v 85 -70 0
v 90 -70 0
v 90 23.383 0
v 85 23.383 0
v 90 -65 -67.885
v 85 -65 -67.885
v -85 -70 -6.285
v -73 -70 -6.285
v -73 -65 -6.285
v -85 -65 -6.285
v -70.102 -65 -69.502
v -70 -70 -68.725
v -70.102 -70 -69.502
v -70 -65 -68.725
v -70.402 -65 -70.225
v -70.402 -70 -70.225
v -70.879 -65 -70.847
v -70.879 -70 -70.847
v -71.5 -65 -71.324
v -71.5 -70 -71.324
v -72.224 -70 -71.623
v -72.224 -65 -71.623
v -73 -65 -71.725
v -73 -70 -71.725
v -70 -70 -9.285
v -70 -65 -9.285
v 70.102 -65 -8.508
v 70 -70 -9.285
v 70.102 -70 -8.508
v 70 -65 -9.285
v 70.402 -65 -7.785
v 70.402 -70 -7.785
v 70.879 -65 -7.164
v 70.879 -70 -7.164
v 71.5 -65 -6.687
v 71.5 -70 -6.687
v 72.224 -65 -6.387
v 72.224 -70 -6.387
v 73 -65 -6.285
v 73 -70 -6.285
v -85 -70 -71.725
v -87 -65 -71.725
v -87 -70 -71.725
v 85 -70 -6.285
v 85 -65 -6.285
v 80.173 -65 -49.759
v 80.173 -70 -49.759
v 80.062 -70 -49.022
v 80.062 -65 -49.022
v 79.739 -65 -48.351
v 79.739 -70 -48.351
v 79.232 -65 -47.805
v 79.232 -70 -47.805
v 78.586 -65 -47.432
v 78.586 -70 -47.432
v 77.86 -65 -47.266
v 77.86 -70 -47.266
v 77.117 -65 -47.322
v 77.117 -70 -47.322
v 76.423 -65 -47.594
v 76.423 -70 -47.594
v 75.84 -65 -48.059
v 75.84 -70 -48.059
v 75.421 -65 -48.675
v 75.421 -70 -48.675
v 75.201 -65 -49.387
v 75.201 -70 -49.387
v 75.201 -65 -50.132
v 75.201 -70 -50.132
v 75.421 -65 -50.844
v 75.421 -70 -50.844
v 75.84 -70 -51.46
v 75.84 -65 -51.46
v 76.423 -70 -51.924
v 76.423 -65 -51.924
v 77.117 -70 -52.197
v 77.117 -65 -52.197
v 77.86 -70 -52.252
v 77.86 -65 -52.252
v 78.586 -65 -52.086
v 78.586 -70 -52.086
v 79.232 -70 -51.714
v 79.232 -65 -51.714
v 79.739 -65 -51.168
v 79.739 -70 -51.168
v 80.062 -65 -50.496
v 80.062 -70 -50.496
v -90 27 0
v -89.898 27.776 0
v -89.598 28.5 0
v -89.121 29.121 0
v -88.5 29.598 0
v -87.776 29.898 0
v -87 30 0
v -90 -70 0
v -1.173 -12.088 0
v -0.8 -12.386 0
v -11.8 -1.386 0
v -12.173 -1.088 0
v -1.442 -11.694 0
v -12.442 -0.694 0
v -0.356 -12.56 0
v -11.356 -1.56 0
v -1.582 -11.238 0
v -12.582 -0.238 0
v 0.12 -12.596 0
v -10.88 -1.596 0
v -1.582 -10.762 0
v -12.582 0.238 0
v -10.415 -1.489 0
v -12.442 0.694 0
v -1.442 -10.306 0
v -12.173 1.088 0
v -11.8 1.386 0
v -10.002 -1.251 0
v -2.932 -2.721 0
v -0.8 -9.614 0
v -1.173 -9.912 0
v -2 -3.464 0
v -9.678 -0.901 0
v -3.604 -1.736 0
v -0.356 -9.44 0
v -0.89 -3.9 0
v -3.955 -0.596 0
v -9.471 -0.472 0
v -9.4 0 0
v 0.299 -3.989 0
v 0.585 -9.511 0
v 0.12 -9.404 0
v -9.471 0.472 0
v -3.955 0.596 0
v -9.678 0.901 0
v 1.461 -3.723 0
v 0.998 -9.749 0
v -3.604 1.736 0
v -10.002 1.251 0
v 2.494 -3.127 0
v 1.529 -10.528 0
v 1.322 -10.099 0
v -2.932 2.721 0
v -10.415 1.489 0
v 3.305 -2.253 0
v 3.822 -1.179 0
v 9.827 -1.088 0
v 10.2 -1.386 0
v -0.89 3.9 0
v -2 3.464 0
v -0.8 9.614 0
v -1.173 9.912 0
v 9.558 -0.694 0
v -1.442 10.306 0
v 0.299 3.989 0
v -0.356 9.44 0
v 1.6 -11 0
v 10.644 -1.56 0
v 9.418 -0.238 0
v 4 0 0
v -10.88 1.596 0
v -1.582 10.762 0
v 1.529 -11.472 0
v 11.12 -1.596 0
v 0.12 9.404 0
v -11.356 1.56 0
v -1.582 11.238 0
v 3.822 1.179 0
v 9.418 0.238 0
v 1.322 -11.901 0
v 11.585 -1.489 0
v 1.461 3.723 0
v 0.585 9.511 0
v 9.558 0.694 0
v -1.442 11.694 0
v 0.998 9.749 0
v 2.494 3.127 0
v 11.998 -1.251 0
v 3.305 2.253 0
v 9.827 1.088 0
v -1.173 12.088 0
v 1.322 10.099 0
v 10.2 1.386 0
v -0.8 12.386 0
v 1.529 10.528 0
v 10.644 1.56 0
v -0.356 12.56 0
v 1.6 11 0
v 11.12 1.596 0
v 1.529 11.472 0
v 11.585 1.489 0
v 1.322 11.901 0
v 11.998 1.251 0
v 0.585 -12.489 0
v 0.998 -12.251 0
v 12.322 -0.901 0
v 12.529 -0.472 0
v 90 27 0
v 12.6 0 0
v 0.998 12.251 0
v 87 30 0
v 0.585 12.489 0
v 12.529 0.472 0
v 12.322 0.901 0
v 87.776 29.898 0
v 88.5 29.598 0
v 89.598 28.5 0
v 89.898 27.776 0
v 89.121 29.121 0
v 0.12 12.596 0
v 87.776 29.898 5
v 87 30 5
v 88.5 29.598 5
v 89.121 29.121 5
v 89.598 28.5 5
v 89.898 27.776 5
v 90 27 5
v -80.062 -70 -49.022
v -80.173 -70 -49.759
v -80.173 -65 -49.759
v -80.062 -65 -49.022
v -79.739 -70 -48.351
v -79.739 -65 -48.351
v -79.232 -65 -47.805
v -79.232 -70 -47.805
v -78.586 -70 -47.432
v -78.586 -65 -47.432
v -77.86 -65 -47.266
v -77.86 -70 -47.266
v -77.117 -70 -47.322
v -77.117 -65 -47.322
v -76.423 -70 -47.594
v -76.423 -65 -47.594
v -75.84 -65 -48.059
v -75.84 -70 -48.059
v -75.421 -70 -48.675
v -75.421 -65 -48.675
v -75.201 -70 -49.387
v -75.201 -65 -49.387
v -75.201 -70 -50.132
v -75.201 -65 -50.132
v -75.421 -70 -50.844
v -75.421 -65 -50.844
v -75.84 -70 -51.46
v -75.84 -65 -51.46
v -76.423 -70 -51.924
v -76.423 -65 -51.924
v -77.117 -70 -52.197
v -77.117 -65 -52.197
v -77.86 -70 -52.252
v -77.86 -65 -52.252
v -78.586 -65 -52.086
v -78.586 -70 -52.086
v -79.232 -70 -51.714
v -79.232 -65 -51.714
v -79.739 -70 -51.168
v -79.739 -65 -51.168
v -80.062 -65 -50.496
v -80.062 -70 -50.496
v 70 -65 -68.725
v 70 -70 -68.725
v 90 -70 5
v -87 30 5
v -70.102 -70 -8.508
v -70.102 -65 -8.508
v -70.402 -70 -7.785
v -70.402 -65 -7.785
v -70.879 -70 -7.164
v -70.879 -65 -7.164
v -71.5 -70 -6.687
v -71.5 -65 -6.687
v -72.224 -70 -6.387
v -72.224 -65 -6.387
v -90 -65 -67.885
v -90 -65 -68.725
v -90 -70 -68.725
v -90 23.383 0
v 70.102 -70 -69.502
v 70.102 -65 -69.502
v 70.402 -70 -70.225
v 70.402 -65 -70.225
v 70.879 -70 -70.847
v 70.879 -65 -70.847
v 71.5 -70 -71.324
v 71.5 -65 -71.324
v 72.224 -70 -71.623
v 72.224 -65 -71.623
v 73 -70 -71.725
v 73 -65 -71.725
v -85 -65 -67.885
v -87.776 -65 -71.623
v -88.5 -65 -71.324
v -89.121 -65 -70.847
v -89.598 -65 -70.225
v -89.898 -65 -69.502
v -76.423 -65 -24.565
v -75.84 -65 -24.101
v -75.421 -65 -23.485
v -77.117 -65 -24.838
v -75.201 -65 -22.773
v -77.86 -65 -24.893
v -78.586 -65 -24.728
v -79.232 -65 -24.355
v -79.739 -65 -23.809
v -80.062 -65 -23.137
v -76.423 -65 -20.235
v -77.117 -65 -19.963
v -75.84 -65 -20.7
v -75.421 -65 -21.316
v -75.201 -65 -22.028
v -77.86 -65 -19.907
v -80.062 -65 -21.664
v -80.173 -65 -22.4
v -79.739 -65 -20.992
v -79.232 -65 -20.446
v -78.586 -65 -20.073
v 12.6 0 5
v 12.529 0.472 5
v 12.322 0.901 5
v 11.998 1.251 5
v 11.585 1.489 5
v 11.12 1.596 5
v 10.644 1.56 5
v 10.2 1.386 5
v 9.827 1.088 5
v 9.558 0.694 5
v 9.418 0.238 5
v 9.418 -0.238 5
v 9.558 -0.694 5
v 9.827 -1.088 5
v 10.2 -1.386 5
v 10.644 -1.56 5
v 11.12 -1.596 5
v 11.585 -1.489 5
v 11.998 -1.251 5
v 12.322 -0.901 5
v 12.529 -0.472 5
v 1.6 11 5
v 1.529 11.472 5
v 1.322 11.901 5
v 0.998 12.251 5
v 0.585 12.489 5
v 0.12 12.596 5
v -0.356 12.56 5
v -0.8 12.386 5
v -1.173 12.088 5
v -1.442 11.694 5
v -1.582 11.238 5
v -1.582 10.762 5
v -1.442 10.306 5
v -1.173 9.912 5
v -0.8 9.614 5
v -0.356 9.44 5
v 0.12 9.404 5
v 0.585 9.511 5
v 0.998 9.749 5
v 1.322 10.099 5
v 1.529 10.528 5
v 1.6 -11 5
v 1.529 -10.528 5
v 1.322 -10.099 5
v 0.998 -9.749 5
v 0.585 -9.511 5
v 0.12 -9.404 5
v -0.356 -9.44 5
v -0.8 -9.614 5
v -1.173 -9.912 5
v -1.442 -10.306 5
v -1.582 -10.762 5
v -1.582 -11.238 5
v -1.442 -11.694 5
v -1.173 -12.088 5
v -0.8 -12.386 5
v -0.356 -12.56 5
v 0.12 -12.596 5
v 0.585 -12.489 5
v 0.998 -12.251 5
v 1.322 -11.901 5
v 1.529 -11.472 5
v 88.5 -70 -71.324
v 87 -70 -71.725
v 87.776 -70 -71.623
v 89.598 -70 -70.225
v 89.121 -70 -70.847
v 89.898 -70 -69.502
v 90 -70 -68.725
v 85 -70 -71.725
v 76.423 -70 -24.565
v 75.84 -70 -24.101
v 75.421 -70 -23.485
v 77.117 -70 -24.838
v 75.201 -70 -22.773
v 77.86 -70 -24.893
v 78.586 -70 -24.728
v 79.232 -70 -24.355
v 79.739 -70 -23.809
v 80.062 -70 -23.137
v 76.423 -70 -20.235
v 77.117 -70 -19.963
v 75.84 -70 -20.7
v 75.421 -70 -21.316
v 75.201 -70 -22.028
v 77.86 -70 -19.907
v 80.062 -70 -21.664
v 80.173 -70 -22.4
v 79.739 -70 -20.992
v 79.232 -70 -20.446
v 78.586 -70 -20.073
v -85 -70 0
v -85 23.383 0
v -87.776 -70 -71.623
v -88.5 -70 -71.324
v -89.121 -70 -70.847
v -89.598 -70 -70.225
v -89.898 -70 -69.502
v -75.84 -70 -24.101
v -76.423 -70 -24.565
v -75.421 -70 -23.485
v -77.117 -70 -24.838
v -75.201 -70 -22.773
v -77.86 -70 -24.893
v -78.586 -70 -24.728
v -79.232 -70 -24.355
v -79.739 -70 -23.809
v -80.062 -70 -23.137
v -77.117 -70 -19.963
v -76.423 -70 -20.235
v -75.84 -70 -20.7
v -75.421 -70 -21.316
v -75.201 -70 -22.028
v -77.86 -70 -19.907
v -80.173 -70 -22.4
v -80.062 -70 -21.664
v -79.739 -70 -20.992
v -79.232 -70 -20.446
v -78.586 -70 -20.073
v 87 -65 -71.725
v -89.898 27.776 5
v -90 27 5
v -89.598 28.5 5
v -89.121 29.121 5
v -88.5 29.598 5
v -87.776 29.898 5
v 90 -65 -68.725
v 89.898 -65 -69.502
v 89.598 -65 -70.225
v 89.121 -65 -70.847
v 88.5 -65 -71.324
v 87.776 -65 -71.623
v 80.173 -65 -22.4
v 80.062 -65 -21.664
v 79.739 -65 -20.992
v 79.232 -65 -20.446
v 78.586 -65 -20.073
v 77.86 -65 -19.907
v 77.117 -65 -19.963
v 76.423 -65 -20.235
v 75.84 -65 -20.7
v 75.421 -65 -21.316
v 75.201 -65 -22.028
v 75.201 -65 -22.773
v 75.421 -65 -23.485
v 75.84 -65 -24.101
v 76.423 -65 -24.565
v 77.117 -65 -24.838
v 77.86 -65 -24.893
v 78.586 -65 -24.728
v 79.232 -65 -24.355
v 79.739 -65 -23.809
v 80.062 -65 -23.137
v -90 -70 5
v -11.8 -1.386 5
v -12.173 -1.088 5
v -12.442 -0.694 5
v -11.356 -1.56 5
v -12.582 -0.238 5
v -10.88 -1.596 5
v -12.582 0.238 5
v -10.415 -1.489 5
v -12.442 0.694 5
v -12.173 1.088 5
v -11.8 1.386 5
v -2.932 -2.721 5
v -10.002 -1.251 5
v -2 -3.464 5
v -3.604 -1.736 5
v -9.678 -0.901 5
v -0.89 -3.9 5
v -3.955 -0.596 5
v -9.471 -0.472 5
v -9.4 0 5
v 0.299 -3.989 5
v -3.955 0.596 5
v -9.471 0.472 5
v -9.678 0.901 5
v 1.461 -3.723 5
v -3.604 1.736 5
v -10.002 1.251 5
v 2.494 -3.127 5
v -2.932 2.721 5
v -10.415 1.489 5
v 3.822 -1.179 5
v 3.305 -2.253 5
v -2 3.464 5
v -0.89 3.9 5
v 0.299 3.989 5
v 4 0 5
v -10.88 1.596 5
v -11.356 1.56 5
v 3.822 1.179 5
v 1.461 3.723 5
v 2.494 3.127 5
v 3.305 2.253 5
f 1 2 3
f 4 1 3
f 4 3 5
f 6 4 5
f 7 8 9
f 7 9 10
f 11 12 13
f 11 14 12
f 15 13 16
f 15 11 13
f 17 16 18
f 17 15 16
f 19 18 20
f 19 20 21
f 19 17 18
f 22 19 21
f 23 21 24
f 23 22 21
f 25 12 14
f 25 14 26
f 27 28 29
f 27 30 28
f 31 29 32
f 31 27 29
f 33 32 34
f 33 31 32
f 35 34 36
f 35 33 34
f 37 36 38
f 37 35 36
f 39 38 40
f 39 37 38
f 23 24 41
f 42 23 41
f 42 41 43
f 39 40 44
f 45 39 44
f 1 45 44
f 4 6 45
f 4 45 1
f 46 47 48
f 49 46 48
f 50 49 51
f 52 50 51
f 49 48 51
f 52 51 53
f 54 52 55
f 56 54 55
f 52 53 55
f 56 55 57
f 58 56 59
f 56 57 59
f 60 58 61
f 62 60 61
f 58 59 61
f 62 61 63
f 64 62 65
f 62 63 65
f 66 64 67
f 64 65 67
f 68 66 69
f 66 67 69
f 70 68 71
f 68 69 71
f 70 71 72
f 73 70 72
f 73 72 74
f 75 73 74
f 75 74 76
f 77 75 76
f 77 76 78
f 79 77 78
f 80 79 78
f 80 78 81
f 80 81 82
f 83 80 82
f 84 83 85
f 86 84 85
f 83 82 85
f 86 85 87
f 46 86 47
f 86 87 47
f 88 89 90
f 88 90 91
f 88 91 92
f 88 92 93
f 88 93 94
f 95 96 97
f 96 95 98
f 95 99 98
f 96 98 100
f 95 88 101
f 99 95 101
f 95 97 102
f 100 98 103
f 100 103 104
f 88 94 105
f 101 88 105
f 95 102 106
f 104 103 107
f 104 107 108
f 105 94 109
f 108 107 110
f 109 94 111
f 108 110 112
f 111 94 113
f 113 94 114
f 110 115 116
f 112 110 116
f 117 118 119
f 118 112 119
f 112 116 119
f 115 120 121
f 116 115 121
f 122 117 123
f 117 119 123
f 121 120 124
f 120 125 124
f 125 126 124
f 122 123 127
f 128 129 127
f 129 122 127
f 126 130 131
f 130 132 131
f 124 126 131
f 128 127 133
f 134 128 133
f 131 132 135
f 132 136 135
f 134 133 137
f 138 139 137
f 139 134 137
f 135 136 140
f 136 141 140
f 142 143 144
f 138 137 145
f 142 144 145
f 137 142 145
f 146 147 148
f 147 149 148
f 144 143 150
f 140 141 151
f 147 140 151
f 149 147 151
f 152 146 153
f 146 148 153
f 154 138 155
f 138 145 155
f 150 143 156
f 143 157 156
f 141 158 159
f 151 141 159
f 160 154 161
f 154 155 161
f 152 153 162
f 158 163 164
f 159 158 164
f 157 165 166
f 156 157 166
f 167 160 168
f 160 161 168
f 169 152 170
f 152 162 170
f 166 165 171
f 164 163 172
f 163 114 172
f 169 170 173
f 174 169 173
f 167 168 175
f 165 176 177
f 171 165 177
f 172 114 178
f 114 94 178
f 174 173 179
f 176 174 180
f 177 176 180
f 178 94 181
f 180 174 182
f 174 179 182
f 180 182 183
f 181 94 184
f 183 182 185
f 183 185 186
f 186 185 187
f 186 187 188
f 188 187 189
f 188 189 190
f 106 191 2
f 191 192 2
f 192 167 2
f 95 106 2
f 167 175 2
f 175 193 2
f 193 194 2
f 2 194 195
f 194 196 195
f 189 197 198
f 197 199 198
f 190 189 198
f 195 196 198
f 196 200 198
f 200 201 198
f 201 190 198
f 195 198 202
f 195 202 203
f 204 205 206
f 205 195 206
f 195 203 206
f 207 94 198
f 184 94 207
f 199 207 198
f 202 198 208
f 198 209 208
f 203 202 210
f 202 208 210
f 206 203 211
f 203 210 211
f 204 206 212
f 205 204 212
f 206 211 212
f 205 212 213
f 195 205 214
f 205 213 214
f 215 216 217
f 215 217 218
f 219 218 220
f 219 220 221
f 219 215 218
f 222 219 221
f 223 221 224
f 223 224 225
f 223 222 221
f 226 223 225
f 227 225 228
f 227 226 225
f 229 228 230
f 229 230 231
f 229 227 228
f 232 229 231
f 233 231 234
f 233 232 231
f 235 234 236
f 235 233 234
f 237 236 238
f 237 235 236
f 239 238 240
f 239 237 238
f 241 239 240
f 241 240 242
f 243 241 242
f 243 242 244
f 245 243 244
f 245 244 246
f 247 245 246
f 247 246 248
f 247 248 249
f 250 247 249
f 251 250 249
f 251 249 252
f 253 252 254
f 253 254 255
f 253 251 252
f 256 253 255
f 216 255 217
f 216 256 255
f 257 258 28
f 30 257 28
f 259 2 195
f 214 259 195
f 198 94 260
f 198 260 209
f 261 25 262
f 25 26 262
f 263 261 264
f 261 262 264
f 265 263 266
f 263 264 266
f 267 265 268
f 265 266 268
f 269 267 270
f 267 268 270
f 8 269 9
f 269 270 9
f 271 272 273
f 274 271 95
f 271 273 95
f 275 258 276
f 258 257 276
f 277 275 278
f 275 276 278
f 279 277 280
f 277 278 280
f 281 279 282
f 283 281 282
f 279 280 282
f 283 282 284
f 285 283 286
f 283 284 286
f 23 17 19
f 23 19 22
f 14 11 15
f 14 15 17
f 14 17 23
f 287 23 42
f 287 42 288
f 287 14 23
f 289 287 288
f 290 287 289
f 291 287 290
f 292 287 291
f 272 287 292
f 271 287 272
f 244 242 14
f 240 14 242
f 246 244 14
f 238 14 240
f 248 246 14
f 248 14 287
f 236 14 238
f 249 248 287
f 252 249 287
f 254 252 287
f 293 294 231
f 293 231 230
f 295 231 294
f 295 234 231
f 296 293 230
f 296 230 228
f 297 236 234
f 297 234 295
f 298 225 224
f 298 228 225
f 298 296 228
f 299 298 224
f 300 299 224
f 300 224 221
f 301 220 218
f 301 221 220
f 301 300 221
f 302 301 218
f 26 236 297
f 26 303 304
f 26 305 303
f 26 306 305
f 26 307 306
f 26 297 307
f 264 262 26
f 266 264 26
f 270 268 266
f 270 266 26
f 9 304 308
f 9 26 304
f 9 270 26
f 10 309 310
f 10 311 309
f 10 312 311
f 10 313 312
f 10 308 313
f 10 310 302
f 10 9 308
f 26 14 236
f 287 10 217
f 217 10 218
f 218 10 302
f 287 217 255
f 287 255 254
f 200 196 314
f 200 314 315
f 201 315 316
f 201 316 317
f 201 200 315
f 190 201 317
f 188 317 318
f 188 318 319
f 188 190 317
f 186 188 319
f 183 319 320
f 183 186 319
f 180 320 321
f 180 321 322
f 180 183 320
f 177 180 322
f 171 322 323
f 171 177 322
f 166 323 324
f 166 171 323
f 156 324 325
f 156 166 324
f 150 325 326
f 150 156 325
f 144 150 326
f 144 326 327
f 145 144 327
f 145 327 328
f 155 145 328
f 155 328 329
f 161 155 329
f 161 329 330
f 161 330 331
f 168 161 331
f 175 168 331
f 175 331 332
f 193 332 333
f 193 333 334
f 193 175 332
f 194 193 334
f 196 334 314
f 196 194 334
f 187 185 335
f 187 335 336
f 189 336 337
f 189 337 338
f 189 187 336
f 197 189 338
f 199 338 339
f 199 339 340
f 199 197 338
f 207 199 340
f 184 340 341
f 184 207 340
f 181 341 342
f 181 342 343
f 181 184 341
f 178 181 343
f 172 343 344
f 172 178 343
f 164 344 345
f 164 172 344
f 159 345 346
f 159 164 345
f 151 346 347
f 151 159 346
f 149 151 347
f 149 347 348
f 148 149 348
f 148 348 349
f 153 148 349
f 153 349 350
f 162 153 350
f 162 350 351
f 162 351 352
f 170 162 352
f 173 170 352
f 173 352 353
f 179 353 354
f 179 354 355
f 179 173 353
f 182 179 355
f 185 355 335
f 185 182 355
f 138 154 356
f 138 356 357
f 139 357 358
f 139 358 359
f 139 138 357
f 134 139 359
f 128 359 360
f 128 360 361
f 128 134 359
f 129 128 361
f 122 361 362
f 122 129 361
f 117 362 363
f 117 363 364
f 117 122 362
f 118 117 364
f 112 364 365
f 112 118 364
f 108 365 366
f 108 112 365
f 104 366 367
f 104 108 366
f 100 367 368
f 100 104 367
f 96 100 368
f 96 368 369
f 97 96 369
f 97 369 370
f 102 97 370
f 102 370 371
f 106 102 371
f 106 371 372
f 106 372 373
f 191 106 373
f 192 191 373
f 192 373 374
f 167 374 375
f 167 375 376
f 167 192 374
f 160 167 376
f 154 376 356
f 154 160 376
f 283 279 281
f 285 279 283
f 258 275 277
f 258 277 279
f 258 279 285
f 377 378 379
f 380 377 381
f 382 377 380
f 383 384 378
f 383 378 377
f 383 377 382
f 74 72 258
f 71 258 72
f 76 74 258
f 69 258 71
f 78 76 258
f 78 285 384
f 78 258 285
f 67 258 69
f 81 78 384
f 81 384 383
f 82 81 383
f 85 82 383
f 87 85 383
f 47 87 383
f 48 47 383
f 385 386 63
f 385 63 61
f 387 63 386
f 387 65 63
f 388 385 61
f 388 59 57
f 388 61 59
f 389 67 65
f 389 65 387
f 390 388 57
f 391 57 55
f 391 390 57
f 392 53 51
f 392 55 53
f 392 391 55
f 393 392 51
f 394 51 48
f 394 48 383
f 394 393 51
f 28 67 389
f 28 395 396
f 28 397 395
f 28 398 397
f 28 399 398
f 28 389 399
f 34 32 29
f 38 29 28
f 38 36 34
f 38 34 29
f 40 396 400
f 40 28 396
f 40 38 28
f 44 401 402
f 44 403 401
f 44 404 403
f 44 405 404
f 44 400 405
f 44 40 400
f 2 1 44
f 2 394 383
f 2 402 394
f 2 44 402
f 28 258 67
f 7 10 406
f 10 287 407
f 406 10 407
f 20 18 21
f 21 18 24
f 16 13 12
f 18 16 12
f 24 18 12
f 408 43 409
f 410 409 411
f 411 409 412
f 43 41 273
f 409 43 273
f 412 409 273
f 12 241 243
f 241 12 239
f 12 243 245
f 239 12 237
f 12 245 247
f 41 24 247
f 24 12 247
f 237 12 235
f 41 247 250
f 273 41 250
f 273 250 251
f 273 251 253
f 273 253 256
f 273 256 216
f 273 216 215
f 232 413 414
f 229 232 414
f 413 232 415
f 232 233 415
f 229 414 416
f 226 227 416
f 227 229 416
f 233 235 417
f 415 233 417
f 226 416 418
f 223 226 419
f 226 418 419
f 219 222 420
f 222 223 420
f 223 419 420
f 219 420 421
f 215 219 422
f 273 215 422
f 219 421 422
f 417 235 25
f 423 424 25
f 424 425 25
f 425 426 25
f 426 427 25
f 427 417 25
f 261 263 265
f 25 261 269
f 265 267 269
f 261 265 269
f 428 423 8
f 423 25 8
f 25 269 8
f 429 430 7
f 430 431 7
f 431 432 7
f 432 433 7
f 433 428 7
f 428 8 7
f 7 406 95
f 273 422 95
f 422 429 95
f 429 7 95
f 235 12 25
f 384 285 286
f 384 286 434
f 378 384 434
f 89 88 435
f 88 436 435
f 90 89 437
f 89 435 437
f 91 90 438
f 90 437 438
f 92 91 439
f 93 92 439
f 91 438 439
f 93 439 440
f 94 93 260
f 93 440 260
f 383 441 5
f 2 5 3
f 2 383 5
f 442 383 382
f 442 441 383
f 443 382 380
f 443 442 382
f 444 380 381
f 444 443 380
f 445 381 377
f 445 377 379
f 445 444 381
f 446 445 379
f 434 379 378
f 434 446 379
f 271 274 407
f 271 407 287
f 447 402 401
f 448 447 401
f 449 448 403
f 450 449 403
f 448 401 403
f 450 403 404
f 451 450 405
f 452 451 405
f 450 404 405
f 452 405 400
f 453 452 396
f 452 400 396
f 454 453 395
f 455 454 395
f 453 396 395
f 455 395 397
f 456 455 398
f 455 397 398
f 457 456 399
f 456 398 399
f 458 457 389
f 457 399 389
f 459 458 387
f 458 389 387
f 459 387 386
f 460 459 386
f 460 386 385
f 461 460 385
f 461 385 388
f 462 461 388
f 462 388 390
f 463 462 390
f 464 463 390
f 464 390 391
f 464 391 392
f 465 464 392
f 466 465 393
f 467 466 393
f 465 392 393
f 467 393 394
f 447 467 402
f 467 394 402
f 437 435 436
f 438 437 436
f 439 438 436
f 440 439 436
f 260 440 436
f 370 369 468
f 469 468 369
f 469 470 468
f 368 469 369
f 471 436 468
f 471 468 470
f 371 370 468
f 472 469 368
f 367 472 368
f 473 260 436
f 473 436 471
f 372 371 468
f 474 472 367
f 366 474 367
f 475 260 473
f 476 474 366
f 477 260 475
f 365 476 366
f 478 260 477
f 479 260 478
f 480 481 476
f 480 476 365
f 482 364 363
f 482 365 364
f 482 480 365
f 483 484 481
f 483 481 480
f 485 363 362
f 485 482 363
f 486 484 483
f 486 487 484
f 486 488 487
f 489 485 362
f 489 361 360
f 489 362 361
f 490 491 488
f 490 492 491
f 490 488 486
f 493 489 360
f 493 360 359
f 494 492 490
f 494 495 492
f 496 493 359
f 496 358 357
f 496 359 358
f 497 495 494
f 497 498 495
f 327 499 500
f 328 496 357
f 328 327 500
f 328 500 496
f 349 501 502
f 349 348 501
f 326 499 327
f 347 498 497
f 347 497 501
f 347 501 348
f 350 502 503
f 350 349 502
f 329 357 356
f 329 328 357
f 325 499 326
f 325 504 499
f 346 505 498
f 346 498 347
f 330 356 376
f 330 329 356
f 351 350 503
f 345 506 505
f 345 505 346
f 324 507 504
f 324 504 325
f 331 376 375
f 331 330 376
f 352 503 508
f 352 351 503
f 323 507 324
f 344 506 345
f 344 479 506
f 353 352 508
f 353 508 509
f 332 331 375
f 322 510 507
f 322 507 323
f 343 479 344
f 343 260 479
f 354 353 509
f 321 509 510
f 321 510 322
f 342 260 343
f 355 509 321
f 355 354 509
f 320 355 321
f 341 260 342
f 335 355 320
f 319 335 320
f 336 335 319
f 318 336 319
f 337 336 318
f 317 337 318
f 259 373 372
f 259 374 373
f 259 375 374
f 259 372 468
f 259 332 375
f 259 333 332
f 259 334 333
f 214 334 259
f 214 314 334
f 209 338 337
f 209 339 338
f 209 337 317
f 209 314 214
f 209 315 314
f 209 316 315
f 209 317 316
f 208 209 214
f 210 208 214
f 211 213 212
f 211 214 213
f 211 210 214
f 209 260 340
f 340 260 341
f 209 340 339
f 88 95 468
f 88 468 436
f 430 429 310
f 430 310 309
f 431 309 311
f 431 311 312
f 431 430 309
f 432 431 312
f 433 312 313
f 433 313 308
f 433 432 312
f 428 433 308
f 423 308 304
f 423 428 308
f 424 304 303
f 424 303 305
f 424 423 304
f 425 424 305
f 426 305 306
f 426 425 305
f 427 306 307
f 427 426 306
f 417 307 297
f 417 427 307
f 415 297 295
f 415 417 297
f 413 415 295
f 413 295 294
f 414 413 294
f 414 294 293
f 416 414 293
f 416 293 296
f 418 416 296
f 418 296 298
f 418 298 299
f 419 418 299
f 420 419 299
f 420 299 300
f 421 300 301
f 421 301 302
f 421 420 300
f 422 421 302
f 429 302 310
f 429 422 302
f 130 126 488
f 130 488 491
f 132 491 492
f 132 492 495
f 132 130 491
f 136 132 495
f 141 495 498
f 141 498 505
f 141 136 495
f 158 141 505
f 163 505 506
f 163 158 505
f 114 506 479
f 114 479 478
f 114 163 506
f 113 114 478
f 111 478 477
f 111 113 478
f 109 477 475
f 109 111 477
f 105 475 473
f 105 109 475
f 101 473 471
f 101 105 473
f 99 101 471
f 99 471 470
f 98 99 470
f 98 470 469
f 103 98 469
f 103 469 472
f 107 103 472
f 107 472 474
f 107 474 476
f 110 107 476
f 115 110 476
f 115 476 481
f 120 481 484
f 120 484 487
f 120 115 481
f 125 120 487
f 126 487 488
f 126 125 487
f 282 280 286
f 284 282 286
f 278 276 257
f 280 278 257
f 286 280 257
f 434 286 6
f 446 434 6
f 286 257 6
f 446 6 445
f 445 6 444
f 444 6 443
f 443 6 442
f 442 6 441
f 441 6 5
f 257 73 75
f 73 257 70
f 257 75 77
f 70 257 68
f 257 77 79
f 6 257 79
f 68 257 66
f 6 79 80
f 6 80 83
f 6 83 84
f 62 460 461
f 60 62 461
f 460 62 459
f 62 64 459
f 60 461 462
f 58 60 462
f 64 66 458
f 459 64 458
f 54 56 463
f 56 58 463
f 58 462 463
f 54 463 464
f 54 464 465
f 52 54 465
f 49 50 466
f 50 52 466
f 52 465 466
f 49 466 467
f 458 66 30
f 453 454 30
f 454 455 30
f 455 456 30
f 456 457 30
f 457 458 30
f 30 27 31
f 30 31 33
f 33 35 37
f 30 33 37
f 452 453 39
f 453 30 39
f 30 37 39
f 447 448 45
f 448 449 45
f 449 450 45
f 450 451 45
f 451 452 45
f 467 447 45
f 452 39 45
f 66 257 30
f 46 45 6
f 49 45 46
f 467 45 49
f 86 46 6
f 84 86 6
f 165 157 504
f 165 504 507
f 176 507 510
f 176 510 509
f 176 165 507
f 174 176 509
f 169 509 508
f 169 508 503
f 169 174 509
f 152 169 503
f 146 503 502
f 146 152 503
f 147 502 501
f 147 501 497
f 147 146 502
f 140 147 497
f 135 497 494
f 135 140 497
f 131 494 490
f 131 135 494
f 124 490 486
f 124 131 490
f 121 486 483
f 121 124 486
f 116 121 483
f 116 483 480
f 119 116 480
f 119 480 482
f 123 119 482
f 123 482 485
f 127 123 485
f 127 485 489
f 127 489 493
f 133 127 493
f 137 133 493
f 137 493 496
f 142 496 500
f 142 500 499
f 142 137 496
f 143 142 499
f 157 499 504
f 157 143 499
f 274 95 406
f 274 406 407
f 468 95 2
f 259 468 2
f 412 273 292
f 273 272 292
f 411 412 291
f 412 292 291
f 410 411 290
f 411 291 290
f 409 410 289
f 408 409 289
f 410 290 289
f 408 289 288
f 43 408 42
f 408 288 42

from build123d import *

# Parameters (mm, degrees)
CROQUIS1_W              = 180
CROQUIS1_H              = 100
CROQUIS1_R              = 4
CROQUIS1_R_2            = 1.6
SALIENTE_EXTRUIR1_DEPTH = 5
SALIENTE_EXTRUIR2_DEPTH = 5
CROQUIS3_W              = 20
CROQUIS3_H              = 65.440512609
CROQUIS3_R              = 2.5
SALIENTE_EXTRUIR3_DEPTH = 5
REDONDEO1_R             = 3
REDONDEO2_R             = 3


with BuildPart() as part:
    # Croquis1 → Saliente-Extruir1 (new body)
    with BuildSketch(Plane.XY):
        with Locations((0, -20)):
            Rectangle(CROQUIS1_W, CROQUIS1_H)
        Circle(CROQUIS1_R, mode=Mode.SUBTRACT)
        with Locations((0, 11)):
            Circle(CROQUIS1_R_2, mode=Mode.SUBTRACT)
        with Locations((11, 0)):
            Circle(CROQUIS1_R_2, mode=Mode.SUBTRACT)
        with Locations((0, -11)):
            Circle(CROQUIS1_R_2, mode=Mode.SUBTRACT)
        with Locations((-11, 0)):
            Circle(CROQUIS1_R_2, mode=Mode.SUBTRACT)
    extrude(amount=SALIENTE_EXTRUIR1_DEPTH)

    # Redondeo2
    redondeo2_edges = [part.edges().sort_by_distance(p)[0] for p in [
        (-90, 30, 2.5),
        (90, 30, 2.5),
    ]]
    fillet(redondeo2_edges, radius=REDONDEO2_R)


with BuildPart() as body_2:
    # Croquis2 → Saliente-Extruir2 (new body)
    with BuildSketch(Plane(origin=(90, 0, 0), x_dir=(0, 0, -1), z_dir=(1, 0, 0))):
        Polygon((0, -70), (0, 23.383318785), (71.725434948, -70), align=None)
    extrude(amount=-SALIENTE_EXTRUIR2_DEPTH)

    # Croquis3 → Saliente-Extruir3 (add)
    with BuildSketch(Plane.XZ.offset(70)):
        with Locations((80, -39.005178644)):
            Rectangle(CROQUIS3_W, CROQUIS3_H)
        with Locations((77.672983275, -22.40042671)):
            Circle(CROQUIS3_R, mode=Mode.SUBTRACT)
        with Locations((77.672983275, -49.759306223)):
            Circle(CROQUIS3_R, mode=Mode.SUBTRACT)
    extrude(amount=-SALIENTE_EXTRUIR3_DEPTH)

    # Redondeo1
    redondeo1_edges = [body_2.edges().sort_by_distance(p)[0] for p in [
        (90, -67.5, -71.725434948),
        (70, -67.5, -71.725434948),
        (70, -67.5, -6.284922339),
    ]]
    fillet(redondeo1_edges, radius=REDONDEO1_R)


with BuildPart() as body_3:
    # Simetría4: mirrored copy
    add(body_2.part.mirror(Plane(origin=(0, 0, 0), x_dir=(0, 0, 1), z_dir=(1, 0, 0))))


solid = Compound([part.part, body_2.part, body_3.part])
